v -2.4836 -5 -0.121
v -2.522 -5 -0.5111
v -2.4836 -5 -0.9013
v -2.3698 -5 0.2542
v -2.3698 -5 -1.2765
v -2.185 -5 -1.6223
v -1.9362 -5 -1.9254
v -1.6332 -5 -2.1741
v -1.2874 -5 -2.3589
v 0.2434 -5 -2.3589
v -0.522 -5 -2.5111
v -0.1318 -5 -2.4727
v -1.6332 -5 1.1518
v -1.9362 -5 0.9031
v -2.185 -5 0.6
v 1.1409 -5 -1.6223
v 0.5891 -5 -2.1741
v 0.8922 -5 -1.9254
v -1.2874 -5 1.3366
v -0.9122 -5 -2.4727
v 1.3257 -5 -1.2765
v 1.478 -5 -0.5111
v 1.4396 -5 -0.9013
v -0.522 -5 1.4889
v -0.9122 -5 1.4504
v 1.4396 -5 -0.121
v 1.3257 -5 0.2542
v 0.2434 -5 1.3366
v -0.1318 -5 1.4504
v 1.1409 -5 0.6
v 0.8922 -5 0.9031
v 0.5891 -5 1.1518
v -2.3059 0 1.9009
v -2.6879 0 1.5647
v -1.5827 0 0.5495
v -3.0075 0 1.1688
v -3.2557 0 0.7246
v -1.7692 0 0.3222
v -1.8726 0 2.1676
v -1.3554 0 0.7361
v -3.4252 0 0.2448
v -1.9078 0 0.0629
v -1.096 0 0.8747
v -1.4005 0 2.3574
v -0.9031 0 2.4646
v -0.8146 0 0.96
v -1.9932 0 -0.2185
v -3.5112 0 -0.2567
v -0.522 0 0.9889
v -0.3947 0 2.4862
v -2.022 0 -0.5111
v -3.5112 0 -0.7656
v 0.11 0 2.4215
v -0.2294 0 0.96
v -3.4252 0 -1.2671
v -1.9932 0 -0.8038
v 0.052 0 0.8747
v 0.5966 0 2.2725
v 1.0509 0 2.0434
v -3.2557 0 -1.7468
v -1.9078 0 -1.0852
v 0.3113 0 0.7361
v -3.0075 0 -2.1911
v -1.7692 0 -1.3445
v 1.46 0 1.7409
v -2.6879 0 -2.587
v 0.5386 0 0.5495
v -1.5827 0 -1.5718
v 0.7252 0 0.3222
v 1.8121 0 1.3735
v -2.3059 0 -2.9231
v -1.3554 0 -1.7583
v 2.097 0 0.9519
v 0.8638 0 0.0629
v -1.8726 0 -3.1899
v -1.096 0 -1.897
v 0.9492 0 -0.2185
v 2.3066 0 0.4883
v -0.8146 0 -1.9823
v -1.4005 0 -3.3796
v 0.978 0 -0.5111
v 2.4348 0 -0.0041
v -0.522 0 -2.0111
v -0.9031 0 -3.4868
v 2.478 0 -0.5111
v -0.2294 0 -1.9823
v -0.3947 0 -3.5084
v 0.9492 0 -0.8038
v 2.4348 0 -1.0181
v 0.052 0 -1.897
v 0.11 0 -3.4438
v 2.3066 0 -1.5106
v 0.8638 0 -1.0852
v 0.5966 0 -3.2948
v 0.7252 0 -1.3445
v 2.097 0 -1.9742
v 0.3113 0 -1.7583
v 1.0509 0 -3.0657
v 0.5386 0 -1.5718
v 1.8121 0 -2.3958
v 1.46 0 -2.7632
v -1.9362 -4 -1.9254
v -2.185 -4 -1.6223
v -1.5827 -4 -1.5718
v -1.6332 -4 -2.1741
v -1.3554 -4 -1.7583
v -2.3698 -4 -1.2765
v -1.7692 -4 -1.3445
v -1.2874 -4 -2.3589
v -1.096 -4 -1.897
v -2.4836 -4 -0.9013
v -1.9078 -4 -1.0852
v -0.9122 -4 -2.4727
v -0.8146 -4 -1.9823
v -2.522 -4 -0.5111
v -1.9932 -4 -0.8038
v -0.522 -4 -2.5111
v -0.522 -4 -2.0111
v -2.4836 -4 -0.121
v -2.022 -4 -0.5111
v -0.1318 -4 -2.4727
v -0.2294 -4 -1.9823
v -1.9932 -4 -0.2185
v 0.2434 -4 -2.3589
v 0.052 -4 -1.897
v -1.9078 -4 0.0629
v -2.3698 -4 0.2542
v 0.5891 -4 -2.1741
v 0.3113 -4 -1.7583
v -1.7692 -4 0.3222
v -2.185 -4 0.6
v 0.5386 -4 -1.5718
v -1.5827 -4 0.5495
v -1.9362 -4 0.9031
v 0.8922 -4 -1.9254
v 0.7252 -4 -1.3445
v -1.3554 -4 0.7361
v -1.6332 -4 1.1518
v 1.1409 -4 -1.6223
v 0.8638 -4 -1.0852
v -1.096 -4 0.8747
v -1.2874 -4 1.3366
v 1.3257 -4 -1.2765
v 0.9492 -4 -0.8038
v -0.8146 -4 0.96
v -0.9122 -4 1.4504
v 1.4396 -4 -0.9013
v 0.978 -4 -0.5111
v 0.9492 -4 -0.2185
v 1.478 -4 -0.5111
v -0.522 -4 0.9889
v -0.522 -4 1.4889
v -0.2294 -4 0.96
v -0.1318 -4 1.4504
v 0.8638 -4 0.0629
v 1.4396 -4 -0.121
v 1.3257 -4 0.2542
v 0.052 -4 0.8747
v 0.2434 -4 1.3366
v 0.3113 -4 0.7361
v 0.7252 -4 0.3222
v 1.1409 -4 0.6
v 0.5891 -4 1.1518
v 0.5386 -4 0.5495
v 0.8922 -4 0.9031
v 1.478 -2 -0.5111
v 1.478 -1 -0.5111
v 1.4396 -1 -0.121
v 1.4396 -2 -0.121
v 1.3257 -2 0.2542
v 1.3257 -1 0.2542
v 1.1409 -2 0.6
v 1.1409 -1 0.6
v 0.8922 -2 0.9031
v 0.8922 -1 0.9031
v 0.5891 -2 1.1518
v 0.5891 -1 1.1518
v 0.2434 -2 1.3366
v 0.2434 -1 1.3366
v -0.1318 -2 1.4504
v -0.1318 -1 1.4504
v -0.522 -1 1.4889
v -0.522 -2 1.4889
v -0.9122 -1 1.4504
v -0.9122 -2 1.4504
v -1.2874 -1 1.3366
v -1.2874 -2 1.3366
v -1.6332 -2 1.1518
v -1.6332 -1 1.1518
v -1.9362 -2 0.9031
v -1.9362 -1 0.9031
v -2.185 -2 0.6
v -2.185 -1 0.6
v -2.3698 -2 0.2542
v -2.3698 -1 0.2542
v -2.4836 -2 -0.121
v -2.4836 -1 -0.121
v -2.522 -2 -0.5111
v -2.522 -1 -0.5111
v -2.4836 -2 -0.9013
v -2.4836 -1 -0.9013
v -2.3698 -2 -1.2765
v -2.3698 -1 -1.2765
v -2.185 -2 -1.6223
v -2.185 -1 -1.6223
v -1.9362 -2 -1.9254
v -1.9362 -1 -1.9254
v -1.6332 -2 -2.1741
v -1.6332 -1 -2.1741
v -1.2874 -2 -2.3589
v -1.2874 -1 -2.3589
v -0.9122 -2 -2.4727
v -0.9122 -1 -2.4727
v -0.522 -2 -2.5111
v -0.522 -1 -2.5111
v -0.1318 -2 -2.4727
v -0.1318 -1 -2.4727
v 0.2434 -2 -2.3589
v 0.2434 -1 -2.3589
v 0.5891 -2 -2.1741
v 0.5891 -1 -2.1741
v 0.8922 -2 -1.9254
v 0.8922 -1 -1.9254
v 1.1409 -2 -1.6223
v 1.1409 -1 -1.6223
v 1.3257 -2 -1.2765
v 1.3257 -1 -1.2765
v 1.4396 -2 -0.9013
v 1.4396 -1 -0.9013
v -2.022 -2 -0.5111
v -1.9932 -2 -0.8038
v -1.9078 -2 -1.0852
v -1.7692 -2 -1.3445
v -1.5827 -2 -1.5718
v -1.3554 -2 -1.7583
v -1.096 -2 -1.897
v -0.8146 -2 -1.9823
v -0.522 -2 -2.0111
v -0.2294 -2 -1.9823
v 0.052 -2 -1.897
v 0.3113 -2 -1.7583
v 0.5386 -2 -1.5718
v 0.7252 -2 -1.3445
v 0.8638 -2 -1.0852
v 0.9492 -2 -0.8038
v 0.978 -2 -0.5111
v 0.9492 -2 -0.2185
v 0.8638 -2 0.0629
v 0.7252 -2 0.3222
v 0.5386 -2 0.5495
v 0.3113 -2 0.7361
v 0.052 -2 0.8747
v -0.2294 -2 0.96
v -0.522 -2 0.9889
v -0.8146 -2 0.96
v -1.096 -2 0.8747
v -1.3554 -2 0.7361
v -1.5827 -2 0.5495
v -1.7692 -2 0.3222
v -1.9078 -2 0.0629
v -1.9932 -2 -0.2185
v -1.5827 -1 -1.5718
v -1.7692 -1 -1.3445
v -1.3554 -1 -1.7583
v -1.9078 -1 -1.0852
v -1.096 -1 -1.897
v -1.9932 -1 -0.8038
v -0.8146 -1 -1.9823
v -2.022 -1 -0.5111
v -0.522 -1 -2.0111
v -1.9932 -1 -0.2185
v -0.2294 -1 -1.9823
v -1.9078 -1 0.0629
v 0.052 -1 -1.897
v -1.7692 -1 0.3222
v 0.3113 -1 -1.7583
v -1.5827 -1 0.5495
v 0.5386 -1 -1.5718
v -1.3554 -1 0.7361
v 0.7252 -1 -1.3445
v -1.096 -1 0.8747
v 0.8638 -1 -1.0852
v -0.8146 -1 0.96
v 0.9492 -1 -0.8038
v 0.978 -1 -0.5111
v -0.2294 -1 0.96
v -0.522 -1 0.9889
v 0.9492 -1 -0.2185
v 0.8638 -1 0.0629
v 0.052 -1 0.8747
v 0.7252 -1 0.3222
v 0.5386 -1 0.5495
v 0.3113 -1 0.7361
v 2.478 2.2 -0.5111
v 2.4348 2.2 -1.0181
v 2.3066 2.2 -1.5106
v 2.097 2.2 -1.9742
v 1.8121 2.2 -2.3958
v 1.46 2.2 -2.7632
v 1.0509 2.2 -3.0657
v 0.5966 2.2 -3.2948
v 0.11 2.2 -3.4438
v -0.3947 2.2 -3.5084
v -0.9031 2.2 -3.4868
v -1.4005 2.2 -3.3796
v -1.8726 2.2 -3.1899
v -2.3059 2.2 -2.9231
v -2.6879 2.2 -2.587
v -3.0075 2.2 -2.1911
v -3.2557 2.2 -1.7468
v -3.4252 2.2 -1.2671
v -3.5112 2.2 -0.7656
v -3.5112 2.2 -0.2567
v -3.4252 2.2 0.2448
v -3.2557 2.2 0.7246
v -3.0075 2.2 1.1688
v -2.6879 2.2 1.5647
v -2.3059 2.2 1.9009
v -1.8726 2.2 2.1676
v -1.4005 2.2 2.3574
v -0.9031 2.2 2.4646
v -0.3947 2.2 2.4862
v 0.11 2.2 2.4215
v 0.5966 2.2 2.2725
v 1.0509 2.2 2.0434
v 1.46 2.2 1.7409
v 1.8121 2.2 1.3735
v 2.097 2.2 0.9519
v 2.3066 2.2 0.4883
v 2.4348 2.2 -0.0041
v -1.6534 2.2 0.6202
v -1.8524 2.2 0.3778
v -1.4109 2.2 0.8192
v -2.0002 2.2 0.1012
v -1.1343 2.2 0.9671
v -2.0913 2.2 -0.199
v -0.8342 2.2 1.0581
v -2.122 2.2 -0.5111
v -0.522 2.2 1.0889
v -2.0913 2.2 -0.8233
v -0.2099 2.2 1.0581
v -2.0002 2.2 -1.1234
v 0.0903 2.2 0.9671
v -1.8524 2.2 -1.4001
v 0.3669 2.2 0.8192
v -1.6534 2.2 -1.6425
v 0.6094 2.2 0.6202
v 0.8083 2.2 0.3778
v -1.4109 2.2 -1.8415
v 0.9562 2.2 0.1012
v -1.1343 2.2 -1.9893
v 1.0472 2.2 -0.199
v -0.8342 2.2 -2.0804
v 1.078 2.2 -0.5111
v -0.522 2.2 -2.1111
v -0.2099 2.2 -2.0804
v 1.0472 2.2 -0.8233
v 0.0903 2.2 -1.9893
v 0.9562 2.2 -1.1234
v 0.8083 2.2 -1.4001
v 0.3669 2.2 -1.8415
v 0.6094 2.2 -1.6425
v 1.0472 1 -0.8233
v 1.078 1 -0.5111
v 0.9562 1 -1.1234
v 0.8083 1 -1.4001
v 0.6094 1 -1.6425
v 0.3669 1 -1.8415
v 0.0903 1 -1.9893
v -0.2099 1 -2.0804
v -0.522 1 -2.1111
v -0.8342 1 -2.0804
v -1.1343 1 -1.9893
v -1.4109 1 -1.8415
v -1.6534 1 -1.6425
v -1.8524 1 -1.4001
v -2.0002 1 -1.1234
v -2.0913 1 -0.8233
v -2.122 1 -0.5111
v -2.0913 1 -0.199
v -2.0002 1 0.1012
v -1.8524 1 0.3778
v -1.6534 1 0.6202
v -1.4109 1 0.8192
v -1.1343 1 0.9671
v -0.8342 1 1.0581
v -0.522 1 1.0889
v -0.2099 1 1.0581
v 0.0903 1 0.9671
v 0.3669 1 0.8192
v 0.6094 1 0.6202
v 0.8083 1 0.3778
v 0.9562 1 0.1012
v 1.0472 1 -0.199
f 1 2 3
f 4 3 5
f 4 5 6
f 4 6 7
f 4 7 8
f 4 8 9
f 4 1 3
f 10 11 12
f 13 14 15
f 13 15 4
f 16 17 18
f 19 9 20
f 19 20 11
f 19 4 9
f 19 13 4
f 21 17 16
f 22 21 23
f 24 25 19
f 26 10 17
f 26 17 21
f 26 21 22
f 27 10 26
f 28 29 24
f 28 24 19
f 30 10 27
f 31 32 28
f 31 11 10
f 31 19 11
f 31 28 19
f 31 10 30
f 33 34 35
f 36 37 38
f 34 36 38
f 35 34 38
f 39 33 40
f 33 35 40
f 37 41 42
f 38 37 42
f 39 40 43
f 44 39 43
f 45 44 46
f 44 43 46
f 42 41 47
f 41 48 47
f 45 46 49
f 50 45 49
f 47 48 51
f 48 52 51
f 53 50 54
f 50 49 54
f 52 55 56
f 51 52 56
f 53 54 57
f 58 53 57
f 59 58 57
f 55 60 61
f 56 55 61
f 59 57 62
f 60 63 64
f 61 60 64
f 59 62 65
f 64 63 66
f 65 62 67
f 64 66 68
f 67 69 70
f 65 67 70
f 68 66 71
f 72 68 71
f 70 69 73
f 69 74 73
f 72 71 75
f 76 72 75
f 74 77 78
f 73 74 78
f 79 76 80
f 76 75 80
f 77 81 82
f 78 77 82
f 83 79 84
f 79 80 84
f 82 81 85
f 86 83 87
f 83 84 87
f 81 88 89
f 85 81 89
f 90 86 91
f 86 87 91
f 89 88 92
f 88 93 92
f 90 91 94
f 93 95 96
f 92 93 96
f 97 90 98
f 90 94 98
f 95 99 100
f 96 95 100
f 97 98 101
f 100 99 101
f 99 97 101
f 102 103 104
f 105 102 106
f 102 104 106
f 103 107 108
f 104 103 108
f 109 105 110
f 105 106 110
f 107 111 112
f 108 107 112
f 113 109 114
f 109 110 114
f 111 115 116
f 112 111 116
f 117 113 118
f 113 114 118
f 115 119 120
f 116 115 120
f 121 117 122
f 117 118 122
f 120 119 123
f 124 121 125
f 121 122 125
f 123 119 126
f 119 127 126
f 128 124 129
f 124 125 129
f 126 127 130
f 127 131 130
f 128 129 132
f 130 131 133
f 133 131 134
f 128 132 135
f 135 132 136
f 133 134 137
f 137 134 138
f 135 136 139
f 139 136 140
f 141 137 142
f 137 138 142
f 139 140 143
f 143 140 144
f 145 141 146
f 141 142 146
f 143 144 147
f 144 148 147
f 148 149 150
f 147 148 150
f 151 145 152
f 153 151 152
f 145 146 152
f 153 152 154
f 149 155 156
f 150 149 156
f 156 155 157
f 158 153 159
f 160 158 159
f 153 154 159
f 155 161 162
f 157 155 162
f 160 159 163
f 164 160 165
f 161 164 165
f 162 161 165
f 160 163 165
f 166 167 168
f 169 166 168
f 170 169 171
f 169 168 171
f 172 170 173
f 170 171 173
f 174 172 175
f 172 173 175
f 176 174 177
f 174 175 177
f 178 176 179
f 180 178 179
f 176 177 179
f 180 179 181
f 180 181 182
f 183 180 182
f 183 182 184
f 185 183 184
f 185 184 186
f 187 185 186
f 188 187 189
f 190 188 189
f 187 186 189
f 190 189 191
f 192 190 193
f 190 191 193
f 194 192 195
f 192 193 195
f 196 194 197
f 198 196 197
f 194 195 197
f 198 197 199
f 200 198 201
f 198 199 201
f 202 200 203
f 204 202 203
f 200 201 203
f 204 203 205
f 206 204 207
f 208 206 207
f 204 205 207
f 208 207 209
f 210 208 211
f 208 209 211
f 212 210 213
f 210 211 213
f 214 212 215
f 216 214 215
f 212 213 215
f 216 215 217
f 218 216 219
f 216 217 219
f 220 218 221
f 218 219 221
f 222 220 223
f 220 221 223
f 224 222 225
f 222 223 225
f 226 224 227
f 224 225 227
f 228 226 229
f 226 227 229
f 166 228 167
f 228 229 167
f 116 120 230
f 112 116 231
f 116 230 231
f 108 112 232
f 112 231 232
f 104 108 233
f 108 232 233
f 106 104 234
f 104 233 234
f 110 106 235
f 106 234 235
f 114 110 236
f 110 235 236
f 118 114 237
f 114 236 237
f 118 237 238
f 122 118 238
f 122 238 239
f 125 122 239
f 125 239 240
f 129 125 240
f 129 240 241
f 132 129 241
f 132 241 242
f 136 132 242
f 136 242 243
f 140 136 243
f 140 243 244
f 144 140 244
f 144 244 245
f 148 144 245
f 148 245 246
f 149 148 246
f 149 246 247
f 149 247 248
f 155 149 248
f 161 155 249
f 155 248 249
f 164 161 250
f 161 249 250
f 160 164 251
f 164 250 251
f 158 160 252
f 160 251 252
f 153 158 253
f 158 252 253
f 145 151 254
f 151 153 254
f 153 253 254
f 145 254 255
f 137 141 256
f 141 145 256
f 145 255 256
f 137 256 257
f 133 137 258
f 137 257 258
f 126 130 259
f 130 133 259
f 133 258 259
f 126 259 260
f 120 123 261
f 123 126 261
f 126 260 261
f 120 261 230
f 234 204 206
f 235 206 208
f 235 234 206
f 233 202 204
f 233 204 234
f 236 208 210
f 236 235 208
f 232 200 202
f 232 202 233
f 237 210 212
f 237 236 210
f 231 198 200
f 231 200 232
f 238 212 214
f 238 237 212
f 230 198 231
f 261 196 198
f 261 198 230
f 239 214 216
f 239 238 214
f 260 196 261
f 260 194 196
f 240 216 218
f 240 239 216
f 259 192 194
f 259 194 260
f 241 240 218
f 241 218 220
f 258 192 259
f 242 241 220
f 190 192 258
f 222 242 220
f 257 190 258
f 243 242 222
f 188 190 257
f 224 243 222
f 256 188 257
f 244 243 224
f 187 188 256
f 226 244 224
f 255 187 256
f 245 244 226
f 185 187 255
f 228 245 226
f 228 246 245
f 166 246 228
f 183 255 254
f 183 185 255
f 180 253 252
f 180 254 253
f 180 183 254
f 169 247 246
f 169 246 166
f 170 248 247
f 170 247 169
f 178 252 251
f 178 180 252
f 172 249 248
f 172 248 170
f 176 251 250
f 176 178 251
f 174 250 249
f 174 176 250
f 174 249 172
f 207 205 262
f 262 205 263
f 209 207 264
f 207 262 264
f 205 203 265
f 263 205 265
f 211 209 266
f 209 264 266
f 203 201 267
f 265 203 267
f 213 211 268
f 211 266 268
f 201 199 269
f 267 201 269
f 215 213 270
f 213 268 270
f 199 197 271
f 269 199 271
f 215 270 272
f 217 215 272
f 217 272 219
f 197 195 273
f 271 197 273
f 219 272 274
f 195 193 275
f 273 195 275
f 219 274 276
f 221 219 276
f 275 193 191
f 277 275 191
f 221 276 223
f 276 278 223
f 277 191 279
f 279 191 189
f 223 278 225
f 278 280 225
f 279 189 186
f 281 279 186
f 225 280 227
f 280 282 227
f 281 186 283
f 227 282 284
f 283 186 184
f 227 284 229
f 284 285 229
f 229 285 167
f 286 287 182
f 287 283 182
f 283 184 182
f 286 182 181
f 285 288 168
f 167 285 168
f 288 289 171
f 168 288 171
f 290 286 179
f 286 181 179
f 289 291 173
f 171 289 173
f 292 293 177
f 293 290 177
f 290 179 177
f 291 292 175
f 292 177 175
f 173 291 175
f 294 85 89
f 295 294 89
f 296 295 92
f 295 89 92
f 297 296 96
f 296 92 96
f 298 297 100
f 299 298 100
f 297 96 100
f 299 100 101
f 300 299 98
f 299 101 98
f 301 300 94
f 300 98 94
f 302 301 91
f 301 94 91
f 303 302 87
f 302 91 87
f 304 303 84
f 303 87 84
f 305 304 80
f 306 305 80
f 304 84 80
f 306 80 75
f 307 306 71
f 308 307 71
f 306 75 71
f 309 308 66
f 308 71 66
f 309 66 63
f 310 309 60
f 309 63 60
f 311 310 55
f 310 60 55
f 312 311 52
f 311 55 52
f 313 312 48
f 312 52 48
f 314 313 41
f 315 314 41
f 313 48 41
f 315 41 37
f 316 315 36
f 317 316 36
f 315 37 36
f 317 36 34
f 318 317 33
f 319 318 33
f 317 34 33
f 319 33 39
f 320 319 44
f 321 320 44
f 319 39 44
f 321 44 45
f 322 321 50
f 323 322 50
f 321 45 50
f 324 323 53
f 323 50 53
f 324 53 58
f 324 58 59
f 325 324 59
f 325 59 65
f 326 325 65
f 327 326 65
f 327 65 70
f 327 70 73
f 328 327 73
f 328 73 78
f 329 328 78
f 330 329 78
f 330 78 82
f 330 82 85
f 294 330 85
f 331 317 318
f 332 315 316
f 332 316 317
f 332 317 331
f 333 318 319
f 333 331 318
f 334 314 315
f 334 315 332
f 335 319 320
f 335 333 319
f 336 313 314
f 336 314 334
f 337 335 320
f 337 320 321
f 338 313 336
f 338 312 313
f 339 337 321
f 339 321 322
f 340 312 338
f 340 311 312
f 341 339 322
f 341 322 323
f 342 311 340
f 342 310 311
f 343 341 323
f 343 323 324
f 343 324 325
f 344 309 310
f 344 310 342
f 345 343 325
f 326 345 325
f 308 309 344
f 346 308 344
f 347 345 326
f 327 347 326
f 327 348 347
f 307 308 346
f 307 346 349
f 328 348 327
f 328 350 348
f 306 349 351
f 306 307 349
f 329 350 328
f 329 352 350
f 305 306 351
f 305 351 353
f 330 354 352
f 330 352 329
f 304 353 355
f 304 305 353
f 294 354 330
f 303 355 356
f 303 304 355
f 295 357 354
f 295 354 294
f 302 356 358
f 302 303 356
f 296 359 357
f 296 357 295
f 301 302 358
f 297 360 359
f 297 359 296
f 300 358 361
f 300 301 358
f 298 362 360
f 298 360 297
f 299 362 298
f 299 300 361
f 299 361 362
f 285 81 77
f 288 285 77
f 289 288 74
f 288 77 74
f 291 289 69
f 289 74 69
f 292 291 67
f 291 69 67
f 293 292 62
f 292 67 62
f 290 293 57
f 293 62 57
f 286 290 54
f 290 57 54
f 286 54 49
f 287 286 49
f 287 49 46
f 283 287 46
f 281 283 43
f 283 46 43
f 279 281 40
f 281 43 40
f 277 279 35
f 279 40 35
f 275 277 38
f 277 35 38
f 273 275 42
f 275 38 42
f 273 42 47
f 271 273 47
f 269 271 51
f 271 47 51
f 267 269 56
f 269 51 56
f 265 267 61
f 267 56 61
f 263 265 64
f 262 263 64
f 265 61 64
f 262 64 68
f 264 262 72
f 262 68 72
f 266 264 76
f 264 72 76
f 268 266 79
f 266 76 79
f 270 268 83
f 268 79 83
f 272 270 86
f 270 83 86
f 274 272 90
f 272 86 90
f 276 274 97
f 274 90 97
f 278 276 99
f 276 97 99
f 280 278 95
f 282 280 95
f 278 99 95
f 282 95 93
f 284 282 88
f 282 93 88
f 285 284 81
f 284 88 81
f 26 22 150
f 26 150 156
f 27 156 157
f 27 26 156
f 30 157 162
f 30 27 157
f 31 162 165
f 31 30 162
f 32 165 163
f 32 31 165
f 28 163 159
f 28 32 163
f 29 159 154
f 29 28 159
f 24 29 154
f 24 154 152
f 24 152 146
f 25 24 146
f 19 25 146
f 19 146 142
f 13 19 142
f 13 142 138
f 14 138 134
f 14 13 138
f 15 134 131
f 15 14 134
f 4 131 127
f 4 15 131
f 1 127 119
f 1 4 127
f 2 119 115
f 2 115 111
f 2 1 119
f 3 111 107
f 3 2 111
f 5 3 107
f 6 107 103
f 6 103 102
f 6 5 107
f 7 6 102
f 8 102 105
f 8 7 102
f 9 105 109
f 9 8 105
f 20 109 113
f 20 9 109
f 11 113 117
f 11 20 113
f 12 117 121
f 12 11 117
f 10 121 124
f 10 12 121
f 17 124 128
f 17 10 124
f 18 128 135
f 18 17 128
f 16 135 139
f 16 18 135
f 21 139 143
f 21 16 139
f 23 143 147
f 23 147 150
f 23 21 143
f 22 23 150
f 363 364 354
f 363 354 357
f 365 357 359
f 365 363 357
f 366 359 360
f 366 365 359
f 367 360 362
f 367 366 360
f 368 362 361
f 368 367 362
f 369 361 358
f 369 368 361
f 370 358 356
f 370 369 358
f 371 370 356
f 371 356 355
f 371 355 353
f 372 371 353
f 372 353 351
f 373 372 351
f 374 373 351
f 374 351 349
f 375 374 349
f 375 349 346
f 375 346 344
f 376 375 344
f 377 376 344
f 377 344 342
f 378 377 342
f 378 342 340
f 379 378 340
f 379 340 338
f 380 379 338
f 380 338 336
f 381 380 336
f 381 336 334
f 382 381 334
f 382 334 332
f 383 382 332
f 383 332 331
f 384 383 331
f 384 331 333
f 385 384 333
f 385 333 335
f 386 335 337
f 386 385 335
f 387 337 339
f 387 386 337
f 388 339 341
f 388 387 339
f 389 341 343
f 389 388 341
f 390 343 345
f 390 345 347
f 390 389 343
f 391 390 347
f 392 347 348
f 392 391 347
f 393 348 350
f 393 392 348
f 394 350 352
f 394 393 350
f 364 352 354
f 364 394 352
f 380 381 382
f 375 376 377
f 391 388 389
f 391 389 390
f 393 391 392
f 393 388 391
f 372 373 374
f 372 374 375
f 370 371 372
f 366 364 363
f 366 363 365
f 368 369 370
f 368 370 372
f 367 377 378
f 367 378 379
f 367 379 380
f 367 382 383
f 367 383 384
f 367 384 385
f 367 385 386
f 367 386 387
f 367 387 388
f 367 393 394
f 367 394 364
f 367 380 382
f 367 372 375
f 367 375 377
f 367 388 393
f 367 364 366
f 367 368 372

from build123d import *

# Parameters (mm, degrees)
SKETCH1_R           = 3
SKETCH1_R_2         = 1.6
BOSS_EXTRUDE1_DEPTH = 2.2
SKETCH1_3_R         = 1.6
BOSS_EXTRUDE2_DEPTH = 1
SKETCH5_R           = 1.5
BOSS_EXTRUDE3_DEPTH = 1
SKETCH6_R           = 2
BOSS_EXTRUDE4_DEPTH = 1
SKETCH8_R           = 1.5
BOSS_EXTRUDE5_DEPTH = 3
BOSS_EXTRUDE6_START = -1
SKETCH10_R          = 2
BOSS_EXTRUDE6_DEPTH = 1


with BuildPart() as part:
    # Sketch1 → Boss-Extrude1 (new body)
    with BuildSketch(Plane(origin=(0, 0, 0), x_dir=(1, 0, 0), z_dir=(0, 1, 0))):
        with Locations((-0.522013312, 0.511138034)):
            Circle(SKETCH1_R)
        with Locations((-0.522013312, 0.511138034)):
            Circle(SKETCH1_R_2, mode=Mode.SUBTRACT)
    extrude(amount=BOSS_EXTRUDE1_DEPTH)

    # Sketch1<3> → Boss-Extrude2 (add)
    with BuildSketch(Plane(origin=(0, 0, 0), x_dir=(1, 0, 0), z_dir=(0, 1, 0))):
        with Locations((-0.522013312, 0.511138034)):
            Circle(SKETCH1_3_R)
    extrude(amount=BOSS_EXTRUDE2_DEPTH)

    # Sketch5 → Boss-Extrude3 (add)
    with BuildSketch(Plane.XZ):
        with Locations((-0.522013312, -0.511138034)):
            Circle(SKETCH5_R)
    extrude(amount=BOSS_EXTRUDE3_DEPTH)

    # Sketch6 → Boss-Extrude4 (add)
    with BuildSketch(Plane.XZ.offset(1)):
        with Locations((-0.522013312, -0.511138034)):
            Circle(SKETCH6_R)
    extrude(amount=BOSS_EXTRUDE4_DEPTH)

    # Sketch8 → Boss-Extrude5 (add)
    with BuildSketch(Plane(origin=(0, -2, 0), x_dir=(-1, 0, 0), z_dir=(0, -1, 0))):
        with Locations((0.522013312, 0.511138034)):
            Circle(SKETCH8_R)
    extrude(amount=BOSS_EXTRUDE5_DEPTH)

    # Sketch10 → Boss-Extrude6 (add)
    with BuildSketch(Plane.XZ.offset(5).offset(BOSS_EXTRUDE6_START)):
        with Locations((-0.522013312, -0.511138034)):
            Circle(SKETCH10_R)
    extrude(amount=BOSS_EXTRUDE6_DEPTH)


solid = part.part
